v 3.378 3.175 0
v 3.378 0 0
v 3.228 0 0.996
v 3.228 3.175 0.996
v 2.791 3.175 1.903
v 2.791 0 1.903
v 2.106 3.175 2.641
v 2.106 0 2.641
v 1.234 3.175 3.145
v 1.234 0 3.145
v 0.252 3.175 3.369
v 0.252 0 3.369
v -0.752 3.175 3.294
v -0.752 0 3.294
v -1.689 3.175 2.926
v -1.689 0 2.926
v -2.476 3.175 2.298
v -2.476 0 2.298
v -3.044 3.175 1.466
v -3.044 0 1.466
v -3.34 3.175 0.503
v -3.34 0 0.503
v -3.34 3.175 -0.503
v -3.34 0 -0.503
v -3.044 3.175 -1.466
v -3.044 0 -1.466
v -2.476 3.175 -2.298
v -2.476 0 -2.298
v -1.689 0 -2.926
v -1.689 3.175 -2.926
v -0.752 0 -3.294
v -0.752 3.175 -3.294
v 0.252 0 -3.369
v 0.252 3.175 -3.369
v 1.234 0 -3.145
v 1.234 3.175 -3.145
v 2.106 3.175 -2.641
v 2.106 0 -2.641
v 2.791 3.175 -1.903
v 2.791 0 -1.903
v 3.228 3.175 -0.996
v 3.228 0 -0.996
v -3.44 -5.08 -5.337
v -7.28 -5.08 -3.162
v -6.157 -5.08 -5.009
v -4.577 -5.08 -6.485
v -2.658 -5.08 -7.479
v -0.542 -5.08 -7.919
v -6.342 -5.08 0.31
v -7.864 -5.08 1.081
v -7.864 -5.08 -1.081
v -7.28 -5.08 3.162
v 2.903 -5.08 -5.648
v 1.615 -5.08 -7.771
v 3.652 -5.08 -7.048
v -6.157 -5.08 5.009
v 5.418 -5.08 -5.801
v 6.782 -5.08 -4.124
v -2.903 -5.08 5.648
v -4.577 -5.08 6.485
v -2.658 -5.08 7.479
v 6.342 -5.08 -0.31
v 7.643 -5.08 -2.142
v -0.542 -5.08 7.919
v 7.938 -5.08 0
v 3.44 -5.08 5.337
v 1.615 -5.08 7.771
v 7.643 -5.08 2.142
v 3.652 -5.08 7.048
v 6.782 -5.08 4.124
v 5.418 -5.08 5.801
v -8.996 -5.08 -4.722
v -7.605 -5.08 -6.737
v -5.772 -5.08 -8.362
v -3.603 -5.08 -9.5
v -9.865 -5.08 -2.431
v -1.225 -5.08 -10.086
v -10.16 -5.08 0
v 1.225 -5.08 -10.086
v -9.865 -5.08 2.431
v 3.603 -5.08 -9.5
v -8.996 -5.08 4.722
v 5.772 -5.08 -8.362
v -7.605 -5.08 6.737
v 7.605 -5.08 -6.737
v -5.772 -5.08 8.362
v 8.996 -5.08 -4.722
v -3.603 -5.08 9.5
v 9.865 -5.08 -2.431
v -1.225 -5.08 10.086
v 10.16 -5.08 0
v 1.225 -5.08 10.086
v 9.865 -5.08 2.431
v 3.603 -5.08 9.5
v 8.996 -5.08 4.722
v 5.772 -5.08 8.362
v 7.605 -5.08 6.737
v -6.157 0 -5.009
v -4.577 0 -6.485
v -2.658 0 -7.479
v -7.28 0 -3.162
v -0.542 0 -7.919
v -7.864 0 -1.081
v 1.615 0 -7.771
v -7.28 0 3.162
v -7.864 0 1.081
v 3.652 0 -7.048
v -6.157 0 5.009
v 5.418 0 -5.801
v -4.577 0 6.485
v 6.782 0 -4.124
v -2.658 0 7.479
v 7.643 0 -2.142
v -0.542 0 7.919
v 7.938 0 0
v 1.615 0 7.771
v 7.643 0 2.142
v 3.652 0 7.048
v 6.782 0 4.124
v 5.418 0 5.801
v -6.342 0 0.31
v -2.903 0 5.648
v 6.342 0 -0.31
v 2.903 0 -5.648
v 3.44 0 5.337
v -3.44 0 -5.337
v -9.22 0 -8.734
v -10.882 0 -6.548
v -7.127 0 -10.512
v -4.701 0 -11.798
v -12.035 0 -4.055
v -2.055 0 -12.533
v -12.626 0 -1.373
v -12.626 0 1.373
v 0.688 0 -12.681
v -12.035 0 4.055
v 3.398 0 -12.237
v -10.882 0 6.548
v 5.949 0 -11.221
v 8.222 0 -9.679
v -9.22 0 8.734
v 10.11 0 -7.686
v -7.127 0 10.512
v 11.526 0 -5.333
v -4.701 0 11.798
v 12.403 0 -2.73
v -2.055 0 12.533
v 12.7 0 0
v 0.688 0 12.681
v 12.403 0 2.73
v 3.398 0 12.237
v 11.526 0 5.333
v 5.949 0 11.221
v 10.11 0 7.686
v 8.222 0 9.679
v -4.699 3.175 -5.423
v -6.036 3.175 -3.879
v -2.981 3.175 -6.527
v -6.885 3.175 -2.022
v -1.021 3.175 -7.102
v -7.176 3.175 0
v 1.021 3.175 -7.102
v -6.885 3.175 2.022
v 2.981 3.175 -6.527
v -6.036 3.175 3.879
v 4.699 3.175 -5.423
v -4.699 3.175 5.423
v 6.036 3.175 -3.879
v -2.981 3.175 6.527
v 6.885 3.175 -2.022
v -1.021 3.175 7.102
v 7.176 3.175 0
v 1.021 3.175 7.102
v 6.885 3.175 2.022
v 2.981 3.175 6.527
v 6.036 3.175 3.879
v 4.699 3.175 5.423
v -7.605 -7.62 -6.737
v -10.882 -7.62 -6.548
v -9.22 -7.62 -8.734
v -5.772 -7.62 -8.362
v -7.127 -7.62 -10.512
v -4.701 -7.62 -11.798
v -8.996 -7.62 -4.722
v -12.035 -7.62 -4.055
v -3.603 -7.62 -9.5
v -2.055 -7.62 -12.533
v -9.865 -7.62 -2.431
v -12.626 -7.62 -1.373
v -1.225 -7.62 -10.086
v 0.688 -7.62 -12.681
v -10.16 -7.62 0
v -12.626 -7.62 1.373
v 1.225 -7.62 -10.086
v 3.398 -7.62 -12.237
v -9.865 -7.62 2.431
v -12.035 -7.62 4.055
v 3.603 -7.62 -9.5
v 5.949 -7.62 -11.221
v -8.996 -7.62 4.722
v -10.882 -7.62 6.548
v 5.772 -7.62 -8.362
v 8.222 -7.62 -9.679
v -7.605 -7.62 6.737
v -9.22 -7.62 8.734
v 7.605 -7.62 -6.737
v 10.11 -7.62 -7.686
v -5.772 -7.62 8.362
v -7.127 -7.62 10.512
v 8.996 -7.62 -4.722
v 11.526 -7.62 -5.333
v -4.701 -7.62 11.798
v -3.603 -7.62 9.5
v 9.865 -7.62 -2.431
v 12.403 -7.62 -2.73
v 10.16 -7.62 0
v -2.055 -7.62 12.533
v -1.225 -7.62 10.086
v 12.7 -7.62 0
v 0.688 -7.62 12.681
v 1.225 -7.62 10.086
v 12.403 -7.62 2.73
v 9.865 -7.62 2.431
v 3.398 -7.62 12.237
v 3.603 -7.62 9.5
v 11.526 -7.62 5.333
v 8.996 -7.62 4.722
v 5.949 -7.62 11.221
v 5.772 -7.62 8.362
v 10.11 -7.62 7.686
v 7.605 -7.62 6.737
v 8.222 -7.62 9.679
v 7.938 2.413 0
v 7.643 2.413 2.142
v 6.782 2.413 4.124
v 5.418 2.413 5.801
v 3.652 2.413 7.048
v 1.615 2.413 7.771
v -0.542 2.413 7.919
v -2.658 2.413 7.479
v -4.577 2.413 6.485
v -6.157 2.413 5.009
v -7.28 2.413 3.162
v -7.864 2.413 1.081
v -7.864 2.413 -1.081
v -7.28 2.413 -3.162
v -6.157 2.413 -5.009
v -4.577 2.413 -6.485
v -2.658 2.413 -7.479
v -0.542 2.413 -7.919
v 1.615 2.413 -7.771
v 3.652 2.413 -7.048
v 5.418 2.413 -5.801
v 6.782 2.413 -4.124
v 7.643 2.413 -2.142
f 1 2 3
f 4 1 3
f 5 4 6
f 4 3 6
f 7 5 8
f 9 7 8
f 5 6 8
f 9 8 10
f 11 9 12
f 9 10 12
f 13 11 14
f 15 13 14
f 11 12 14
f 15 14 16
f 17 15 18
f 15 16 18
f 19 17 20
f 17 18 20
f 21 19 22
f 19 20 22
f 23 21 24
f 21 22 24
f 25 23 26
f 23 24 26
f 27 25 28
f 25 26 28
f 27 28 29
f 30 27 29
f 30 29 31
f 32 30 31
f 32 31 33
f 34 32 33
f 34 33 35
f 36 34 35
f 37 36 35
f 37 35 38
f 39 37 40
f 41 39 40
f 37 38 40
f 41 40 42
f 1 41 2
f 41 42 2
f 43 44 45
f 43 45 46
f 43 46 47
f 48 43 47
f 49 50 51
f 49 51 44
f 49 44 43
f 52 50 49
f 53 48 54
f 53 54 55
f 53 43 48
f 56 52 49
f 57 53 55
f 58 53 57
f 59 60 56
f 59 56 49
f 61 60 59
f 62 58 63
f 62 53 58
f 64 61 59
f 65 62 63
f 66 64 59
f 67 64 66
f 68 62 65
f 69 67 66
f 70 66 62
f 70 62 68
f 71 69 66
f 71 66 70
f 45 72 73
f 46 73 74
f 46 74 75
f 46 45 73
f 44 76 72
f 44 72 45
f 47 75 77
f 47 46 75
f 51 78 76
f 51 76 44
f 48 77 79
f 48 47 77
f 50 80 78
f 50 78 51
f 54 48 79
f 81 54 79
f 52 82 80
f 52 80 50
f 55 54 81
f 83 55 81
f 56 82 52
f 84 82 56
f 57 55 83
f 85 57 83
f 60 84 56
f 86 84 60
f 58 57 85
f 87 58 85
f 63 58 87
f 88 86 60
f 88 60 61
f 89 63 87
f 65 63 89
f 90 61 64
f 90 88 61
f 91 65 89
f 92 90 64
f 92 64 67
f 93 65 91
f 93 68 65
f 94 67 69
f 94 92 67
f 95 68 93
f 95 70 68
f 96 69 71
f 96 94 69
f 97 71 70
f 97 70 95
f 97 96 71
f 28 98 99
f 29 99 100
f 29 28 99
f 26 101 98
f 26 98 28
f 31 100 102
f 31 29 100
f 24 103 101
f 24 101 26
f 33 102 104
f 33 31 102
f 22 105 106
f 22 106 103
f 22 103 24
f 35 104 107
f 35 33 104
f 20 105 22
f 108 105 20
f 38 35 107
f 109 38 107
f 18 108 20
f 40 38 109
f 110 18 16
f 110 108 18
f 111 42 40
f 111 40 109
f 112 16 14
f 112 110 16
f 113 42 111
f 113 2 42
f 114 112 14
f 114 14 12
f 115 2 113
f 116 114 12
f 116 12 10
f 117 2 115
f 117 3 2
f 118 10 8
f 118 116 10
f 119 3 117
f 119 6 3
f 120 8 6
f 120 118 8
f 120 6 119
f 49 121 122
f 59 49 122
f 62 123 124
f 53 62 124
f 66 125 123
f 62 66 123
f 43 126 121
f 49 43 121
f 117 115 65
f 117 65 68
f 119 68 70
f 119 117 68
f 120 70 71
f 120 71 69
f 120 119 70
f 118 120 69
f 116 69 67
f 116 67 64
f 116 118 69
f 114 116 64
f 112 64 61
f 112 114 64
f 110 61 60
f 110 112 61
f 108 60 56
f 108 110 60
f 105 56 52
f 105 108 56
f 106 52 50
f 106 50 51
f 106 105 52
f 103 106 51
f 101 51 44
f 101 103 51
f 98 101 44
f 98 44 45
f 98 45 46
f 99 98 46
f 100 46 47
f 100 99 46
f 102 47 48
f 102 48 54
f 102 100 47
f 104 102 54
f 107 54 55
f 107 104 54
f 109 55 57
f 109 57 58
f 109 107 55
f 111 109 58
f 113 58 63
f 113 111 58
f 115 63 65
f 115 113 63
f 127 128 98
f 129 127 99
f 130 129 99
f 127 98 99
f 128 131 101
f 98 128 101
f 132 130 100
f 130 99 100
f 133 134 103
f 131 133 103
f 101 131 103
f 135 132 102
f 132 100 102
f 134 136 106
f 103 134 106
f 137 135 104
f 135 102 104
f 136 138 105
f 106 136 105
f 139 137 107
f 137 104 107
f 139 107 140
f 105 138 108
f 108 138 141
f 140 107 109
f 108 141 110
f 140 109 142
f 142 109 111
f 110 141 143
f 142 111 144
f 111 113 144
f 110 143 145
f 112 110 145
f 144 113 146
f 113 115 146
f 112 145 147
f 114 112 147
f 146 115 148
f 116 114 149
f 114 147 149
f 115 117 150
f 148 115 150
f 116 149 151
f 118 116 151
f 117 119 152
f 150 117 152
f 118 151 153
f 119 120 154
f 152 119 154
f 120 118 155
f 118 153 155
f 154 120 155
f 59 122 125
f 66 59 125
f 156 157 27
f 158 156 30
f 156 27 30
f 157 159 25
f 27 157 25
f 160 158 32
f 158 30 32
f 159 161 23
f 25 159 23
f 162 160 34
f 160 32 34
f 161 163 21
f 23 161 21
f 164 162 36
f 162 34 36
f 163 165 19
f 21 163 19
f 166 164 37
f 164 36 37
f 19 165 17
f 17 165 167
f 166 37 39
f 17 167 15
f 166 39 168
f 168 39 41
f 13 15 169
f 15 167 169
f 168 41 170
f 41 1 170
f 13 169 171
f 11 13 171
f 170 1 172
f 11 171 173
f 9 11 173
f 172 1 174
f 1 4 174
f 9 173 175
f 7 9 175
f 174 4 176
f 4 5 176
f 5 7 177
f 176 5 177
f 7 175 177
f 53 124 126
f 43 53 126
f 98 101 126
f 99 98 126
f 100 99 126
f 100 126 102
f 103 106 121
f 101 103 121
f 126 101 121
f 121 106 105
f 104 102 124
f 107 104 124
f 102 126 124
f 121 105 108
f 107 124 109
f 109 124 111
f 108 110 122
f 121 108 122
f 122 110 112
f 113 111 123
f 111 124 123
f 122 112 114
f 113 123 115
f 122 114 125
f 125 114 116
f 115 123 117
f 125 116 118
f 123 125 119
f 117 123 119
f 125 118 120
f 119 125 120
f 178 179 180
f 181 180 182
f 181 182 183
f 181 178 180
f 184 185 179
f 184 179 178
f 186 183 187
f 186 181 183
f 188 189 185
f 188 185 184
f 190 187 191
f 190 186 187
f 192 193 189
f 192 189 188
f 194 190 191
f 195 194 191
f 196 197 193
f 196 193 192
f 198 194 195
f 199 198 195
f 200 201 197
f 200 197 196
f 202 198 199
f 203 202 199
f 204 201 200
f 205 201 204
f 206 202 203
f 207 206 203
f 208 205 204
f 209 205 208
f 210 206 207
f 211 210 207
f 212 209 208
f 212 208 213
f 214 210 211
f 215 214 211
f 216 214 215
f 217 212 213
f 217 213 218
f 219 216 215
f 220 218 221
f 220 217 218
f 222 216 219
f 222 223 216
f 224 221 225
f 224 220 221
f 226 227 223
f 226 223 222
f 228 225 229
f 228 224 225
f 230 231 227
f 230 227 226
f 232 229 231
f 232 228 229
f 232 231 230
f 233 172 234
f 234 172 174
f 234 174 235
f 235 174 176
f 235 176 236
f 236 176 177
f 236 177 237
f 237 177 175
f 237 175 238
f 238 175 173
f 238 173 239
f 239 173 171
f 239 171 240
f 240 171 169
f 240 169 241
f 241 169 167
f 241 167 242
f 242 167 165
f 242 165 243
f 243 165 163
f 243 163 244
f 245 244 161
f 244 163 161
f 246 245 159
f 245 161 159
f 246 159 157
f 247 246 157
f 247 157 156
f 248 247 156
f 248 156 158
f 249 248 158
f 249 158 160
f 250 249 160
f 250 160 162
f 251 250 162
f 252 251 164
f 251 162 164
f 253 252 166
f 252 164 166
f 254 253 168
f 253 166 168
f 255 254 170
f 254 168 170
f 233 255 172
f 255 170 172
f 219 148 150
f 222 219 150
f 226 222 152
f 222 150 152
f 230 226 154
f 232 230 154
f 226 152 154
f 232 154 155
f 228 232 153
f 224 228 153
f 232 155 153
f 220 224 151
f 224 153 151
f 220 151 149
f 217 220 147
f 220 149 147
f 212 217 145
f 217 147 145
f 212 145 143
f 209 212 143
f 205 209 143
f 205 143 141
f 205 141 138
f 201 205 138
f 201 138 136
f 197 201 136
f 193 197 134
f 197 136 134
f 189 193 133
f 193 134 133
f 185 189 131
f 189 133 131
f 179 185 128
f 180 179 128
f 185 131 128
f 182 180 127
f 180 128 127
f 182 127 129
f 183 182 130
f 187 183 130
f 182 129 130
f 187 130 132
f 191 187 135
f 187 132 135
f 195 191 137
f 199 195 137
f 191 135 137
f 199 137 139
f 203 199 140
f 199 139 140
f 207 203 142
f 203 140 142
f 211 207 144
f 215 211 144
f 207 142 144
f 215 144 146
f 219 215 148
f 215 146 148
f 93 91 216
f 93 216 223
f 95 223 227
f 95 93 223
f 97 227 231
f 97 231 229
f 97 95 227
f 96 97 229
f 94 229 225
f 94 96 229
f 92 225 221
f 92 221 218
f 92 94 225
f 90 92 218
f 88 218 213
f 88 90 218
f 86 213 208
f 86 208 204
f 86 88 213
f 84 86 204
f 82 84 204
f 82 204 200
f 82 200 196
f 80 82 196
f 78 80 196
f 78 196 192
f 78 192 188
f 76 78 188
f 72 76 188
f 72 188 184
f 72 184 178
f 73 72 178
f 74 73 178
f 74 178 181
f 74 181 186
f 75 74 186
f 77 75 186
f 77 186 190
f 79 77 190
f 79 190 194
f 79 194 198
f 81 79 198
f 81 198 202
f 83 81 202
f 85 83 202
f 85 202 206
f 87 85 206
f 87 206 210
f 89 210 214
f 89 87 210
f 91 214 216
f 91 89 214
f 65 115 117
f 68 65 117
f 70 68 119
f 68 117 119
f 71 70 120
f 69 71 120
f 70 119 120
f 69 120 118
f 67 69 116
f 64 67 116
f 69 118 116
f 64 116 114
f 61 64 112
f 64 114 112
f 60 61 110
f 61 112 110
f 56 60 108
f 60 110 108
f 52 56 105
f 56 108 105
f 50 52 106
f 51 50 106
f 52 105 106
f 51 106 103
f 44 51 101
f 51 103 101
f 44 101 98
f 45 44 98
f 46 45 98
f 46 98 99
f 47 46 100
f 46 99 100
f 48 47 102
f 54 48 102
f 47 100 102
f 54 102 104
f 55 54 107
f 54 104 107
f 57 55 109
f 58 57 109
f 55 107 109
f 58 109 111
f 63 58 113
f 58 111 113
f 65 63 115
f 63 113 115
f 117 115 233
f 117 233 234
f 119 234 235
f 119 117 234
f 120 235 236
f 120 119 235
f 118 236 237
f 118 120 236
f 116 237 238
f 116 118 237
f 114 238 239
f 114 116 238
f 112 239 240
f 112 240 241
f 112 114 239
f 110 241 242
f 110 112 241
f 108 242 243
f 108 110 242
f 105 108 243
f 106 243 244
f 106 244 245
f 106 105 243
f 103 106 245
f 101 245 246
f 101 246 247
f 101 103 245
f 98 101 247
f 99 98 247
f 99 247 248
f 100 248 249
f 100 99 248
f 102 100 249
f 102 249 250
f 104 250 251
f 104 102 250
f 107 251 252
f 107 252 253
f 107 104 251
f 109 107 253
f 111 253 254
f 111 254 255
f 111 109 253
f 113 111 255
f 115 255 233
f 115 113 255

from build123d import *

# Parameters (mm, degrees)
F0_R     = 7.9375
F0_R_2   = 3.3782
F1_DEPTH = 3.175
F0_R_3   = 12.7
F0_R_4   = 10.16
F2_DEPTH = 7.62
F3_DEPTH = 5.08
F4_DEPTH = 5.08
F5_SIZE  = 0.762


with BuildPart() as f1:
    # F0 (on Front) → F1 (new body)
    with BuildSketch(Plane.XZ):
        Circle(F0_R)
        Polygon((-3.4397021091, -5.3374697952), (-6.3422354891, 0.3101345103), (-2.90253338, 5.6476043055), (3.4397021091, 5.3374697952), (6.3422354891, -0.3101345103), (2.90253338, -5.6476043055), align=None, mode=Mode.SUBTRACT)
        Polygon((-2.90253338, 5.6476043055), (-6.3422354891, 0.3101345103), (-3.4397021091, -5.3374697952), (2.90253338, -5.6476043055), (6.3422354891, -0.3101345103), (3.4397021091, 5.3374697952), align=None)
        Circle(F0_R_2, mode=Mode.SUBTRACT)
    extrude(amount=-F1_DEPTH)



with BuildPart() as f2:
    # F0 (on Front) → F2 (new body)
    with BuildSketch(Plane.XZ):
        Circle(F0_R_3)
        Circle(F0_R_4, mode=Mode.SUBTRACT)
    extrude(amount=F2_DEPTH)


with BuildPart() as f1_1:
    add(f1.part)

    add(f2.part)  # F3 merges F2
    # F0 (on Front) → F3 (join)
    with BuildSketch(Plane.XZ):
        Circle(F0_R_4)
        Circle(F0_R, mode=Mode.SUBTRACT)
    extrude(amount=F3_DEPTH)

    # F5
    f5_edges = [f1_1.edges().sort_by_distance(p)[0] for p in [
        (-7.9375, 3.175, 0),
    ]]
    chamfer(f5_edges, length=F5_SIZE)


with BuildPart() as f4:
    # F0 (on Front) → F4 (new body)
    with BuildSketch(Plane.XZ):
        Circle(F0_R)
        Polygon((-3.4397021091, -5.3374697952), (-6.3422354891, 0.3101345103), (-2.90253338, 5.6476043055), (3.4397021091, 5.3374697952), (6.3422354891, -0.3101345103), (2.90253338, -5.6476043055), align=None, mode=Mode.SUBTRACT)
    extrude(amount=F4_DEPTH)


solid = Compound([f1_1.part, f4.part])
